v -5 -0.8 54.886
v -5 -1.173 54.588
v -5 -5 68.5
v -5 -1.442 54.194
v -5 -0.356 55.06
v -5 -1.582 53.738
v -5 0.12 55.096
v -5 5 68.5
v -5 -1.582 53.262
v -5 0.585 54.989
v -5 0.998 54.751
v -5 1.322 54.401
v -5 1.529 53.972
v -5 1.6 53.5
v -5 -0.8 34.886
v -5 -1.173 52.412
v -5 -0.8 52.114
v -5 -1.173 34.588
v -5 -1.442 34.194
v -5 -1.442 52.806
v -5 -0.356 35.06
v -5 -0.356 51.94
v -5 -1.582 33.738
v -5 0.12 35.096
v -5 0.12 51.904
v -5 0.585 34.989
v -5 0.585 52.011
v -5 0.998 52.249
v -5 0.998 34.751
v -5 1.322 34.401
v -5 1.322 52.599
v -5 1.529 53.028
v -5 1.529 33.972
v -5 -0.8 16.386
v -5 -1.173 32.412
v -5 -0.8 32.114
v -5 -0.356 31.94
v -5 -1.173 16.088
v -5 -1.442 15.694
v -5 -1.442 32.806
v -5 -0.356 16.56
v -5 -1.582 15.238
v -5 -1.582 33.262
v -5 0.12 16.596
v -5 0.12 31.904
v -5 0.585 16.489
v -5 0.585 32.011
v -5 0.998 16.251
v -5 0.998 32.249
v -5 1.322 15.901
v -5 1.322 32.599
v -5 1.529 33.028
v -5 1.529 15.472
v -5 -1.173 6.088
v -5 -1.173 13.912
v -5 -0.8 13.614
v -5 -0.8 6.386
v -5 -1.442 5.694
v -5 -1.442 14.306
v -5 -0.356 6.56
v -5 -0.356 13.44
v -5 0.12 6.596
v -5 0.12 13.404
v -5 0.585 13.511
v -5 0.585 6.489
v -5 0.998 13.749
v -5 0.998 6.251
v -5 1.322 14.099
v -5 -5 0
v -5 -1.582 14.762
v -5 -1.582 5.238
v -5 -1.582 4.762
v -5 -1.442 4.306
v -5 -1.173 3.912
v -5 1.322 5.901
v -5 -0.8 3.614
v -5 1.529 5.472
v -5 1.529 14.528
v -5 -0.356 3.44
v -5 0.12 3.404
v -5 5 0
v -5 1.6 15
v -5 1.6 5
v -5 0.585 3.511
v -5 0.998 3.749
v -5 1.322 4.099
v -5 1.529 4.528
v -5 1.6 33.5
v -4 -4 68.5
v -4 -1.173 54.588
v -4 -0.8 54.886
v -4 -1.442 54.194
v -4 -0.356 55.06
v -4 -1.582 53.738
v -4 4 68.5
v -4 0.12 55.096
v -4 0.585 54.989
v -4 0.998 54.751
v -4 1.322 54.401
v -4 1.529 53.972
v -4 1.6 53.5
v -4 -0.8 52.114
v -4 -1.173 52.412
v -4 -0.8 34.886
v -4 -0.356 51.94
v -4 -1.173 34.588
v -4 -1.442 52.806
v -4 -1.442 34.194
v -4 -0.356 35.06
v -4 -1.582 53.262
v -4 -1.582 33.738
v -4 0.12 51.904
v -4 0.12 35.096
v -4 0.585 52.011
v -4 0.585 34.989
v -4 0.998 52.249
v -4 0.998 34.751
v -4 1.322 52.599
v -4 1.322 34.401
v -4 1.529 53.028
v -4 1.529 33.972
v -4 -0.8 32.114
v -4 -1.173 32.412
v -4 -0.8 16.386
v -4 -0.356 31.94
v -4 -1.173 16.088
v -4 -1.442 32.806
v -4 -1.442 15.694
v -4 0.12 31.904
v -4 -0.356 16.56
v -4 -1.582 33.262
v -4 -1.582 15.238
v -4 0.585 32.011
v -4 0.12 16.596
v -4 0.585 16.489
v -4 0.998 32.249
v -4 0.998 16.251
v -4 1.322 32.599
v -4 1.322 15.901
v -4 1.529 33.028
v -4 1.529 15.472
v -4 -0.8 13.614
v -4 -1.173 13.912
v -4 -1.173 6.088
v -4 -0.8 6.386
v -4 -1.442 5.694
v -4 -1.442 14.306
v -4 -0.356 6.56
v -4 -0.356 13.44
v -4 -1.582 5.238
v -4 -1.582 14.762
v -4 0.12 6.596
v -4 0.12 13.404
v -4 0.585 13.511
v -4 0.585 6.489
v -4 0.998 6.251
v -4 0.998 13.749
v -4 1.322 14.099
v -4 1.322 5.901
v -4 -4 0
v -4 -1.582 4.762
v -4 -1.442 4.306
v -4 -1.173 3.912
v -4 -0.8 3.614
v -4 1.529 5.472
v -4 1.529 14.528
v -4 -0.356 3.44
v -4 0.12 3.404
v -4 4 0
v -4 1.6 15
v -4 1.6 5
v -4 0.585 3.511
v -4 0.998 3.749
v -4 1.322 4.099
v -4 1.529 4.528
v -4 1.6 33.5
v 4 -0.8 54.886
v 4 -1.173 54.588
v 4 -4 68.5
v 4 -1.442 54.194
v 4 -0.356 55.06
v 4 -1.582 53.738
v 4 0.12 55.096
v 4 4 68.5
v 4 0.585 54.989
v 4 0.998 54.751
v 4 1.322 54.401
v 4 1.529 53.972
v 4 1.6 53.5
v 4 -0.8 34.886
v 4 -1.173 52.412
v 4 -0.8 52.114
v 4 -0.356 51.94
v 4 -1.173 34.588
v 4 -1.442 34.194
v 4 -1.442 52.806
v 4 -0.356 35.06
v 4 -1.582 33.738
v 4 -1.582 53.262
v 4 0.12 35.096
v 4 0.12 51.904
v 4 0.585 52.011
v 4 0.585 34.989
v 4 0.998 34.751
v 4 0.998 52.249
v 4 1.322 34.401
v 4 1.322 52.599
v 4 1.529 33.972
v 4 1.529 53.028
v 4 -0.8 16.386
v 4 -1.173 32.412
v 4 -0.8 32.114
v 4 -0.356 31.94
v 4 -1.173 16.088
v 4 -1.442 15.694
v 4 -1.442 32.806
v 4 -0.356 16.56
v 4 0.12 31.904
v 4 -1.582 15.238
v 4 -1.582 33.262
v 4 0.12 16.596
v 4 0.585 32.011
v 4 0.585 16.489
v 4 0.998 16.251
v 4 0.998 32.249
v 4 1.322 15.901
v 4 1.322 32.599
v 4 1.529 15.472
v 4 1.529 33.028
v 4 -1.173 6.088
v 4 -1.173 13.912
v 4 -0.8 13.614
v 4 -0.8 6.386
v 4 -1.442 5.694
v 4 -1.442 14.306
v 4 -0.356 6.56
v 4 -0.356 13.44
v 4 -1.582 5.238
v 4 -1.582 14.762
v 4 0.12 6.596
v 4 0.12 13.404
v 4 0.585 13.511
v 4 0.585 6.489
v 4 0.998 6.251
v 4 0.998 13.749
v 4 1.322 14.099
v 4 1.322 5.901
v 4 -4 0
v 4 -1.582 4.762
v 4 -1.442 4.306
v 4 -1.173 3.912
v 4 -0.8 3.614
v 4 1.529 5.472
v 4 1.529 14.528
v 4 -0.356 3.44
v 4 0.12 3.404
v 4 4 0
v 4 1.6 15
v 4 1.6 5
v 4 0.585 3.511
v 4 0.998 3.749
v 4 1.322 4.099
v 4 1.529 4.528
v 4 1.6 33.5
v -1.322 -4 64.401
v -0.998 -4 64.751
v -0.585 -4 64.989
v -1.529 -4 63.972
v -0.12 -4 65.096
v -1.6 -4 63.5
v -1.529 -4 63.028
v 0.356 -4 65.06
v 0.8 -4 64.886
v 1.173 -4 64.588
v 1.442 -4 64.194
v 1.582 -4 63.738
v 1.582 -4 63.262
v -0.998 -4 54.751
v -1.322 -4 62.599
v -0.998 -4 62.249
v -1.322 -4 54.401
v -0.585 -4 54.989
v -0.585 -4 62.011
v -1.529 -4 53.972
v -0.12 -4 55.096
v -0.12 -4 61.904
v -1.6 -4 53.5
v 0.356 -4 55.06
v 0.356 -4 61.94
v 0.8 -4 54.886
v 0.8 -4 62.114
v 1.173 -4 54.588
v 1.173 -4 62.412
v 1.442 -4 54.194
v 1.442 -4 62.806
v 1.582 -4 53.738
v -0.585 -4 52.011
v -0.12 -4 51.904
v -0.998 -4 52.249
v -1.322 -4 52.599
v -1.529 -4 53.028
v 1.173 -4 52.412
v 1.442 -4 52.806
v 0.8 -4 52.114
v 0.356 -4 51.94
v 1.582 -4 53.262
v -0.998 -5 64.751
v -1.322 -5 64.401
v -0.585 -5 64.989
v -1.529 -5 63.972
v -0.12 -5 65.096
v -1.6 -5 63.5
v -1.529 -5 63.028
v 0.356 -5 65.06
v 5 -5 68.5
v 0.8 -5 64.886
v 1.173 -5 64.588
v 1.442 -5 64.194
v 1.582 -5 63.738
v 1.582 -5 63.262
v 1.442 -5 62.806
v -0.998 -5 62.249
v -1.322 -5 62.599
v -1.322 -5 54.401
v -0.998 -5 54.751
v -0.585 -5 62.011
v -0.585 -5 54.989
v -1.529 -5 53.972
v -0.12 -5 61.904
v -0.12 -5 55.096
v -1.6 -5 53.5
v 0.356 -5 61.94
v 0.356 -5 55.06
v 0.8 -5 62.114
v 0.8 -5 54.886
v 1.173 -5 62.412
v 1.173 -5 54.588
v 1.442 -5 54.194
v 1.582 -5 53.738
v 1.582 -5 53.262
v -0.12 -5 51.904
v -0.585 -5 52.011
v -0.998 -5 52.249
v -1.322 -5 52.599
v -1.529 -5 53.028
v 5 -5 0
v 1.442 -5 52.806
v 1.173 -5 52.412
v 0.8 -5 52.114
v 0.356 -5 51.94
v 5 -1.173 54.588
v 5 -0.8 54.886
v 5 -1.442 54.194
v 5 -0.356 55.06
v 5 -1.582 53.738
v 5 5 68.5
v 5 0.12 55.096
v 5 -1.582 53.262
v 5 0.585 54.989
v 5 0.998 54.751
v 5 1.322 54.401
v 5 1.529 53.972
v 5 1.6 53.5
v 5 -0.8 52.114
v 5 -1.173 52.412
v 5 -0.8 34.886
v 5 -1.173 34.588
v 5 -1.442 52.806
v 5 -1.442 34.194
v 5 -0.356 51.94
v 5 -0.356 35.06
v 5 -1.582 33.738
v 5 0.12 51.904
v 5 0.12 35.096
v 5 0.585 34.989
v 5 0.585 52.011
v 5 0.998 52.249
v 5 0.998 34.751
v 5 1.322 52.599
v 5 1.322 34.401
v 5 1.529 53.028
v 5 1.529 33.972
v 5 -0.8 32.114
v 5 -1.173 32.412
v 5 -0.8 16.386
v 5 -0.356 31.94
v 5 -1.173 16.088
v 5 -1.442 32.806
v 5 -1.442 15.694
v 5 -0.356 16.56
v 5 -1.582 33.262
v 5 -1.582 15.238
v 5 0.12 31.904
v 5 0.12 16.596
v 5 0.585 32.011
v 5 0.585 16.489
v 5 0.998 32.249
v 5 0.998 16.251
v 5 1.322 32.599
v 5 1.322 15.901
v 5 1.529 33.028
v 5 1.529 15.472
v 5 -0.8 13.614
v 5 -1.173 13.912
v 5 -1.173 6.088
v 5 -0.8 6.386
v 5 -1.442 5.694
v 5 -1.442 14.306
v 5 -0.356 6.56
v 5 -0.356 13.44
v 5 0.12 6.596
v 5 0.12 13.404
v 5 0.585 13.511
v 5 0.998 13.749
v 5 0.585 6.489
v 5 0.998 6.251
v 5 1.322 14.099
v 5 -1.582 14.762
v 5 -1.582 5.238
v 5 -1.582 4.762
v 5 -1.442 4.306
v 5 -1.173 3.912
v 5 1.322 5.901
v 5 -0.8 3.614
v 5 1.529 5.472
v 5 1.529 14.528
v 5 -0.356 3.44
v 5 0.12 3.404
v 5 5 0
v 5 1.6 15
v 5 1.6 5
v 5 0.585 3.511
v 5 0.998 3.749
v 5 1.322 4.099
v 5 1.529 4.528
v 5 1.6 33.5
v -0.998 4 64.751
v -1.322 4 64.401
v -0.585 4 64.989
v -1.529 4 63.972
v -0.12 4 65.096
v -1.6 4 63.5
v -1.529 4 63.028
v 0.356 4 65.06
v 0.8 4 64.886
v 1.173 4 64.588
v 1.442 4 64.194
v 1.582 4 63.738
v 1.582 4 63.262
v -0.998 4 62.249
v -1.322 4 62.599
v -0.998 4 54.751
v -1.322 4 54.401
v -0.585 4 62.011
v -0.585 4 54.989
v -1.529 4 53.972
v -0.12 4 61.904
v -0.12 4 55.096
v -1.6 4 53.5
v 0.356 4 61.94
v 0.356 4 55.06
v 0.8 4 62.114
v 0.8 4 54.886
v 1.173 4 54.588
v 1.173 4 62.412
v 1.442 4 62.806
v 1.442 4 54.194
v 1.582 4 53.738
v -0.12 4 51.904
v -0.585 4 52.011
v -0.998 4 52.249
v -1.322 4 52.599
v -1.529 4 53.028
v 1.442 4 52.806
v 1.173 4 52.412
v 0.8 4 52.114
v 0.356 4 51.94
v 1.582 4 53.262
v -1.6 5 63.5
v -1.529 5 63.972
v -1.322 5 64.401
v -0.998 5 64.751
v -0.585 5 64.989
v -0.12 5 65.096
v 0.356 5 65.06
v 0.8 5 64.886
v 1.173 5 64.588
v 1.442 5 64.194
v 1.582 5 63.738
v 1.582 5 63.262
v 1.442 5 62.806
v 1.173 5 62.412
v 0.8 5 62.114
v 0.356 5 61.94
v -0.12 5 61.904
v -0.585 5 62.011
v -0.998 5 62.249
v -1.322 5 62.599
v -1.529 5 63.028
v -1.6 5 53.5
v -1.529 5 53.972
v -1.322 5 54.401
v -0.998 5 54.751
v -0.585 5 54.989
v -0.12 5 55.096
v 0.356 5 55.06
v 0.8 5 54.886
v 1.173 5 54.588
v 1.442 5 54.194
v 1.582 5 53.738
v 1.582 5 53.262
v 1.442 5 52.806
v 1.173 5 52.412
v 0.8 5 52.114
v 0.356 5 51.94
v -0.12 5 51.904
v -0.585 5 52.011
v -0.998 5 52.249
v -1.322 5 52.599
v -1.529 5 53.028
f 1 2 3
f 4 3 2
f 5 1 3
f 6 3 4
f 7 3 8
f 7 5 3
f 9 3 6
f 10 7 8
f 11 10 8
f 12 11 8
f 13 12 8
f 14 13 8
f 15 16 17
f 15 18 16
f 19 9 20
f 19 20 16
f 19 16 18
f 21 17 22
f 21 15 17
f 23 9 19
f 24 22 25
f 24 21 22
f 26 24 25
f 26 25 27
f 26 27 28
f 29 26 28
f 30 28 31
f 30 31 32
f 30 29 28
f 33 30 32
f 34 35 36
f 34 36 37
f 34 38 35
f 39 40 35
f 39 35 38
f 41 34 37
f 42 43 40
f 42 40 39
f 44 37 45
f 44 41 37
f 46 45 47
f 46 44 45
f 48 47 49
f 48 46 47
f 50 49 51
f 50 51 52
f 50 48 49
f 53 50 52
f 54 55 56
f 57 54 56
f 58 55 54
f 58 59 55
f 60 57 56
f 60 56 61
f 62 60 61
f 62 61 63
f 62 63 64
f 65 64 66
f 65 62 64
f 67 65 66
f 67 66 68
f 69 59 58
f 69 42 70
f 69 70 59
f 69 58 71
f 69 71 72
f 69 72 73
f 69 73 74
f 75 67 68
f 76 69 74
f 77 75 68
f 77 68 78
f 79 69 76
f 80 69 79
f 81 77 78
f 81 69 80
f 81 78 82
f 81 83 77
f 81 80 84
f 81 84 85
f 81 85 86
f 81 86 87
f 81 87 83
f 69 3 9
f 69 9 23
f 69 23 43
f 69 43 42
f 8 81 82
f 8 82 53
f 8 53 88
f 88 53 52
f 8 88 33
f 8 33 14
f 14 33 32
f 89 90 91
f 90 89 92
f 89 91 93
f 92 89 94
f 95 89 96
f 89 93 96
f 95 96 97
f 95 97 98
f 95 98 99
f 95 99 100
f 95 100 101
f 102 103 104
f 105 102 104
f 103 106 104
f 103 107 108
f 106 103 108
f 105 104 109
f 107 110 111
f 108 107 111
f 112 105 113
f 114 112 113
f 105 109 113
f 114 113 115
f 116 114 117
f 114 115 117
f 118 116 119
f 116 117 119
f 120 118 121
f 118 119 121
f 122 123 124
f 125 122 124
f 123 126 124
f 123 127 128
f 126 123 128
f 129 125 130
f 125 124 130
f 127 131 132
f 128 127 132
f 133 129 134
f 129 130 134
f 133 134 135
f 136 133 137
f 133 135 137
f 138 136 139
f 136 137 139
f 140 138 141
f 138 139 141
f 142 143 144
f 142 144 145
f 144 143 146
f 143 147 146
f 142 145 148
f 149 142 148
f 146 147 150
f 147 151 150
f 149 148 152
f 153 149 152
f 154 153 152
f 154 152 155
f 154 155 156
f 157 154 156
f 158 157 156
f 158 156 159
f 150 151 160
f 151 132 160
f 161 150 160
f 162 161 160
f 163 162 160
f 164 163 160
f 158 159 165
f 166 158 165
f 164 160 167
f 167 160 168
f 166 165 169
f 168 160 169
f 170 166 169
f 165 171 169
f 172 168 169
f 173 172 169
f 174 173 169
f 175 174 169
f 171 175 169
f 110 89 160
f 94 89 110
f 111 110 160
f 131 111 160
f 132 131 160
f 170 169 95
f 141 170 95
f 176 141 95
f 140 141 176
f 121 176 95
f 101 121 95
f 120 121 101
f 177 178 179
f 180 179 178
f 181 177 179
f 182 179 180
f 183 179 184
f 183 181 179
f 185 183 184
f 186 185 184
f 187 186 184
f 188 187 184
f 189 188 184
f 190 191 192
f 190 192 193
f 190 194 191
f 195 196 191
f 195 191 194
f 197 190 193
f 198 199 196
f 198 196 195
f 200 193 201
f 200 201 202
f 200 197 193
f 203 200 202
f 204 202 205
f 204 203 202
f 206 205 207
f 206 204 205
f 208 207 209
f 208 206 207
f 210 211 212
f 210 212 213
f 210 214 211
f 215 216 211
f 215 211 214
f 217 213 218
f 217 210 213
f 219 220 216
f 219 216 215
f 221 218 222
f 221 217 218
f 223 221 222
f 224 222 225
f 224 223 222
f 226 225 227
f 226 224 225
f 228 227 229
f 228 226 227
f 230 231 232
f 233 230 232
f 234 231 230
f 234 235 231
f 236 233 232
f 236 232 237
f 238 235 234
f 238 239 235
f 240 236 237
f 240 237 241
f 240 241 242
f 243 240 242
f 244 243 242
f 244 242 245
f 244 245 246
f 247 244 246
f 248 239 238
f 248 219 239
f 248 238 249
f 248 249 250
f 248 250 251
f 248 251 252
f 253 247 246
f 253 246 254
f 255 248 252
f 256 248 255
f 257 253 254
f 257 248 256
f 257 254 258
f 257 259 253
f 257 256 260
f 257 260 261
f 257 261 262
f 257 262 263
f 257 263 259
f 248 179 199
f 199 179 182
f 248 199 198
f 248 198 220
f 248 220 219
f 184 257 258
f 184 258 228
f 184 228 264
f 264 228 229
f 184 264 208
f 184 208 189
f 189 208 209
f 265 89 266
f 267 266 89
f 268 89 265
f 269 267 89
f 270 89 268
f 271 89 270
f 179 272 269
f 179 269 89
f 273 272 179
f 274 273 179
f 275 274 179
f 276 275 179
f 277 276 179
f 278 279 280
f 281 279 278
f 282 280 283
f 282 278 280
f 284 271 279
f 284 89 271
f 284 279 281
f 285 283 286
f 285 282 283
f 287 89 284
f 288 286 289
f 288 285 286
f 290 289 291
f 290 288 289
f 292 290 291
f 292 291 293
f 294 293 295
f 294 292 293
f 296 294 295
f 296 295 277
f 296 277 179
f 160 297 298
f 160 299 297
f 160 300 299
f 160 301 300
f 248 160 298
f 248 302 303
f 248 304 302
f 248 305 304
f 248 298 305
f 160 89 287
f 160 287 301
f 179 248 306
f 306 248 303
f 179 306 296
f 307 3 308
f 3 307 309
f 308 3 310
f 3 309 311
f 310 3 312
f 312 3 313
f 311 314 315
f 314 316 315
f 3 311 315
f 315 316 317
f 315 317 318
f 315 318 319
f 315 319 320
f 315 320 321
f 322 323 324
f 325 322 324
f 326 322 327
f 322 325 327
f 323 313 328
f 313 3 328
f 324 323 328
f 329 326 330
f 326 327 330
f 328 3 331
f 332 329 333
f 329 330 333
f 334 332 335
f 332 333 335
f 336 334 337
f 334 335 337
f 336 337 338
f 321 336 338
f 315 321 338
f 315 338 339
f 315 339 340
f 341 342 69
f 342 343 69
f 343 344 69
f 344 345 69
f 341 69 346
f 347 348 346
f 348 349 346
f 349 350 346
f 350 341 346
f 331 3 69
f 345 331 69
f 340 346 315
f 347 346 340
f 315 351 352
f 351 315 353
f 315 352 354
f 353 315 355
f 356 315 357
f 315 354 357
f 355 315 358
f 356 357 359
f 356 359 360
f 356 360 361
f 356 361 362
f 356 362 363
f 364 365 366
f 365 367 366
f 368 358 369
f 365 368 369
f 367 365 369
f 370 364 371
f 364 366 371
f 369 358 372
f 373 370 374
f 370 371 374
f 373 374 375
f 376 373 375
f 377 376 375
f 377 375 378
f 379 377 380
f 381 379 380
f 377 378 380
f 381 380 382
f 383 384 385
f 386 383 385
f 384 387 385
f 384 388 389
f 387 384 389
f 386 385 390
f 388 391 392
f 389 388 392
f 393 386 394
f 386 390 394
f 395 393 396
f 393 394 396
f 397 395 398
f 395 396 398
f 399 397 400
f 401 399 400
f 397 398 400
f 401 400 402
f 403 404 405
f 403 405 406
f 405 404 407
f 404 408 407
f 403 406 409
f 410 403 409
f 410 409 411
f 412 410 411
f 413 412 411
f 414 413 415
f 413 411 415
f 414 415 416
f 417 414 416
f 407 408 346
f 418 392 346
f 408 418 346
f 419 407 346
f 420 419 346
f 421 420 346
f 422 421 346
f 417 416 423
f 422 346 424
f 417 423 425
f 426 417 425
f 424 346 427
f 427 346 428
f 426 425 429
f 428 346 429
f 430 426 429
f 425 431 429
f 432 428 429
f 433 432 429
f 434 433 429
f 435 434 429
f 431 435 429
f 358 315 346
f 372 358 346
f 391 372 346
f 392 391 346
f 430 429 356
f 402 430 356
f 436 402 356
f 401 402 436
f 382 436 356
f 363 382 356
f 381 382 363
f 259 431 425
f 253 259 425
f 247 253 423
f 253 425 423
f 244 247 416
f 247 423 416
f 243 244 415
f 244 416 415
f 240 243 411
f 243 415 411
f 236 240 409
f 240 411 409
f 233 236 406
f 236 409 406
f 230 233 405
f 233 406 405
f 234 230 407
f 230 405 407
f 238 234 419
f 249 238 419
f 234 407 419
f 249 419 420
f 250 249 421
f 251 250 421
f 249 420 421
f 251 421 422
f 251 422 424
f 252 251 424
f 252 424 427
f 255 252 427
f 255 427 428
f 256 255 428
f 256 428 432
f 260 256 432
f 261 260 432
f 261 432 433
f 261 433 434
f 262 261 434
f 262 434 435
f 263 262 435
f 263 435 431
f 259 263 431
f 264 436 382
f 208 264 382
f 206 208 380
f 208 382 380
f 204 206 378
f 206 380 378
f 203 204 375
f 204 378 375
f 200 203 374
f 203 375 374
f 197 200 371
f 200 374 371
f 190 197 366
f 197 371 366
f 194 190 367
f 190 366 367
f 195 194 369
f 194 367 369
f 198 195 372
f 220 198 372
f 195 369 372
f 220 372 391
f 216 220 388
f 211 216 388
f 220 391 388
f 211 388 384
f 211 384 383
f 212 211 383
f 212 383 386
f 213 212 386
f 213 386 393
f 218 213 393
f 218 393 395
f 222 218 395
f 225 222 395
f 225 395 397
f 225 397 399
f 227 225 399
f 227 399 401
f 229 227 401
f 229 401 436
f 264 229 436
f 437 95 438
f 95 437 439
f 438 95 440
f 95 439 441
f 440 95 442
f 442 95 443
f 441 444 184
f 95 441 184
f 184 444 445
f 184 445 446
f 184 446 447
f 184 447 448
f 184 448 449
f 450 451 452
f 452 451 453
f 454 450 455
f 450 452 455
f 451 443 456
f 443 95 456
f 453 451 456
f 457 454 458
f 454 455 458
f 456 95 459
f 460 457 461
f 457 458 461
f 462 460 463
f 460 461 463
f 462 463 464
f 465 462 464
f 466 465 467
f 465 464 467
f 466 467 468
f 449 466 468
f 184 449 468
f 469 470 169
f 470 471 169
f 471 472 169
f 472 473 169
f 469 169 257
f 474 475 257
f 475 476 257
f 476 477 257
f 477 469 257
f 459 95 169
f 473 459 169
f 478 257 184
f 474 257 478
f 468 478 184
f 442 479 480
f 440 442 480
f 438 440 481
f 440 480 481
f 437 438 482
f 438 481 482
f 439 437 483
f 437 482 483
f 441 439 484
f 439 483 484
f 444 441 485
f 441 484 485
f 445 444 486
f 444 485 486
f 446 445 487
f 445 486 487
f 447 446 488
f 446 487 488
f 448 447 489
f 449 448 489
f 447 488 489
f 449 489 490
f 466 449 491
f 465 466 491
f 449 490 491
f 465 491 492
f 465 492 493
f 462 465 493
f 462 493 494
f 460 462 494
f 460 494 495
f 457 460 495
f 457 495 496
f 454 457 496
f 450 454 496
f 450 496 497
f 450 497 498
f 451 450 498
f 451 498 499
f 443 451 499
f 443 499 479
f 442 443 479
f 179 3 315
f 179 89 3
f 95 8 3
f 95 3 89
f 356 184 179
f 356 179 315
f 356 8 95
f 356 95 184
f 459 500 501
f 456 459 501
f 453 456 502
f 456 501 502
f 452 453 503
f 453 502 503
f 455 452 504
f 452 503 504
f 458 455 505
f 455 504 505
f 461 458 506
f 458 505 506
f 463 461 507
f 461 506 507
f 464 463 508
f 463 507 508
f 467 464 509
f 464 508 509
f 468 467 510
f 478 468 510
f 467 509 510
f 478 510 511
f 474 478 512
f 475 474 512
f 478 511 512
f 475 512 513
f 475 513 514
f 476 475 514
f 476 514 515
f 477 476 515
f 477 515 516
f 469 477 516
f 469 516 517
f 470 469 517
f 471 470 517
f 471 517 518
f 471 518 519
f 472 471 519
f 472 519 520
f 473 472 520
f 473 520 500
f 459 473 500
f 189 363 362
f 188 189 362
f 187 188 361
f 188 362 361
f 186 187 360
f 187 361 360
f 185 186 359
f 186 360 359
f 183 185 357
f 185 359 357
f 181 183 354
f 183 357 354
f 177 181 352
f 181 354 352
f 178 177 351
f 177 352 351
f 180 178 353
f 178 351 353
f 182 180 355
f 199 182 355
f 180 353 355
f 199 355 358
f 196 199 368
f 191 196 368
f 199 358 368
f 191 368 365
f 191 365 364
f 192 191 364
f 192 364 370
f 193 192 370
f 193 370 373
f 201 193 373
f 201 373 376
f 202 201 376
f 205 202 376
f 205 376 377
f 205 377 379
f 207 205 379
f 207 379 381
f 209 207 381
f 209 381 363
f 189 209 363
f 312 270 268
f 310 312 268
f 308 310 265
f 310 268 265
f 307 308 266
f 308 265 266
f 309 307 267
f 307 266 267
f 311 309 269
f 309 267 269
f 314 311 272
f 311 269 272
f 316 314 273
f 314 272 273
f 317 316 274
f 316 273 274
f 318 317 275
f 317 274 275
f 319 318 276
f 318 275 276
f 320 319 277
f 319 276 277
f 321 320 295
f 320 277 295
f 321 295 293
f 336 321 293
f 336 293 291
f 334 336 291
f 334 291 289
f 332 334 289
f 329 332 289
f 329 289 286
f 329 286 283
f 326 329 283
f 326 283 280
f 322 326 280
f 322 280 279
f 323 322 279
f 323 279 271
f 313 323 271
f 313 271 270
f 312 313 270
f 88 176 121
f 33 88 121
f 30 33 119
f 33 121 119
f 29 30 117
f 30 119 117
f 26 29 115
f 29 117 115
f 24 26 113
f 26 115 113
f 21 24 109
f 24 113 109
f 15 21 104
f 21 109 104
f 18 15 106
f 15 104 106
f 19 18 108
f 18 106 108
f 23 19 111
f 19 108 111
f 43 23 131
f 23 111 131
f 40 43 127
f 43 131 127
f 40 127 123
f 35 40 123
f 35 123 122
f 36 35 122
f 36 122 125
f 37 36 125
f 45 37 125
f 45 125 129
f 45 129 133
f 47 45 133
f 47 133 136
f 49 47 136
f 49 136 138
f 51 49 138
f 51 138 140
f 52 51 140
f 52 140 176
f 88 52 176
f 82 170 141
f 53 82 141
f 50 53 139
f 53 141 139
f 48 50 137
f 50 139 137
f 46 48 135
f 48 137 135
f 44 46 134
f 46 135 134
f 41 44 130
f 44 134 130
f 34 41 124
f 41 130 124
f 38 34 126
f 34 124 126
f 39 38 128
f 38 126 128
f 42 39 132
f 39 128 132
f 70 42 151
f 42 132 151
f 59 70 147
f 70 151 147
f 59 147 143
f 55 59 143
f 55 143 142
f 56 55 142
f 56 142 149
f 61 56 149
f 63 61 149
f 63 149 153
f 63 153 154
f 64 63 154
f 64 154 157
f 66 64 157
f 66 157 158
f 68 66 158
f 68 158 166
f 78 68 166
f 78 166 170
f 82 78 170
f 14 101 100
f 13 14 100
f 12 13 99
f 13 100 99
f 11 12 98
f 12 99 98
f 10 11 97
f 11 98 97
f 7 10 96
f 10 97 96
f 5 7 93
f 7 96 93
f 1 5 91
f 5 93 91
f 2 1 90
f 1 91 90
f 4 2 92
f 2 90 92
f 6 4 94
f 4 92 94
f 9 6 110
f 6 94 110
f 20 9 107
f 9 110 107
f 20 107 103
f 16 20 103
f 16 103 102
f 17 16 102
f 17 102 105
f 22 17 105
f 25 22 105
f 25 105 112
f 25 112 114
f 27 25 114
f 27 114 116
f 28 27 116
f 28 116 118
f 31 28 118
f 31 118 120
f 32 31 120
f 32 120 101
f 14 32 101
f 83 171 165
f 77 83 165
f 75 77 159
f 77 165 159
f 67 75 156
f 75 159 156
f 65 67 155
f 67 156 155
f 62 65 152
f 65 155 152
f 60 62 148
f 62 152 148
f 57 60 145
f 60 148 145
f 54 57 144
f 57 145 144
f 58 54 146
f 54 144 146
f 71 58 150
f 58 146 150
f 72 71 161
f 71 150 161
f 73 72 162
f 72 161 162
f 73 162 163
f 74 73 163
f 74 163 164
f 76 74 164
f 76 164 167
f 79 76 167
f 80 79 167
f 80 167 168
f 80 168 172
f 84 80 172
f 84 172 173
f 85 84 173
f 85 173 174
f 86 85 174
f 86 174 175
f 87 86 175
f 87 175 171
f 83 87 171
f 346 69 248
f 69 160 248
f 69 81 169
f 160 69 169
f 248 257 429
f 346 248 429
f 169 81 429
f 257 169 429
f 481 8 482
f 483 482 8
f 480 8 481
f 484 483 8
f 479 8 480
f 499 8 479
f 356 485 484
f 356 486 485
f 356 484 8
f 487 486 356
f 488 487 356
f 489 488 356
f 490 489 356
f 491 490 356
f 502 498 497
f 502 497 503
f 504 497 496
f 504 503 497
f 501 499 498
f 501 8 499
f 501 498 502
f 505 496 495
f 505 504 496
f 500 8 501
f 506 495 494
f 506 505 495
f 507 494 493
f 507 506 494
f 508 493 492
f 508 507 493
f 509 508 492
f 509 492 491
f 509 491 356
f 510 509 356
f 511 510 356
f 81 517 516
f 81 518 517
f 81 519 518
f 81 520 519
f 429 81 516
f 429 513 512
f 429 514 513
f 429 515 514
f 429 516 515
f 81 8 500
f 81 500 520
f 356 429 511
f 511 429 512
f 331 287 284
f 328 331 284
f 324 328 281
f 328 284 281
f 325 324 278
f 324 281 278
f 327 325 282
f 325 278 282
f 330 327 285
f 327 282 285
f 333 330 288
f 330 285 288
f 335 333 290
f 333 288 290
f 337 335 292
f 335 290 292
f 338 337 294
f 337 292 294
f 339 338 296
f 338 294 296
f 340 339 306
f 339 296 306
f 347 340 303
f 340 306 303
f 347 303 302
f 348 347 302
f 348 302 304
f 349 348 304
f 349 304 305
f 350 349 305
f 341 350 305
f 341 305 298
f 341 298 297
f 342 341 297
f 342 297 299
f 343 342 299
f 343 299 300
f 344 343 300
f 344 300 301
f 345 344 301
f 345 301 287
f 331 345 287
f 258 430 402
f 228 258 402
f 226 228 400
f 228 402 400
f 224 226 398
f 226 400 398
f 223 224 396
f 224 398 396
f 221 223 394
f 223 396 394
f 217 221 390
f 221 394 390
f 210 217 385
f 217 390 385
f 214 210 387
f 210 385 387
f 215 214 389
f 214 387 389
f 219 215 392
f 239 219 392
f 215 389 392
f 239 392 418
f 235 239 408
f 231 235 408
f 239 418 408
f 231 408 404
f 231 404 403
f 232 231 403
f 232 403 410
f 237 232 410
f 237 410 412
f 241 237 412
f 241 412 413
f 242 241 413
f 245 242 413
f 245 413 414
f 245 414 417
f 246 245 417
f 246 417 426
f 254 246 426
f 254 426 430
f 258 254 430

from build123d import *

# Parameters (mm, degrees)
SKETCH_1_W          = 10
SKETCH_1_H          = 10
SKETCH_1_W_2        = 8
SKETCH_1_H_2        = 8
EXTRUDE_1_DEPTH     = 68.5
SKETCH_2_R          = 1.6
CUT_EXTRUDE_1_DEPTH = 70.406411808
SKETCH_3_R          = 1.6
CUT_EXTRUDE_2_DEPTH = 70.406411808
SKETCH_4_R          = 1.6
CUT_EXTRUDE_3_DEPTH = 70.406411808


with BuildPart() as part:
    # ｽｹｯﾁ1 → 押し出し-薄板1 (new body)
    with BuildSketch(Plane.XY):
        Rectangle(SKETCH_1_W, SKETCH_1_H)
        Rectangle(SKETCH_1_W_2, SKETCH_1_H_2, mode=Mode.SUBTRACT)
    extrude(amount=EXTRUDE_1_DEPTH)

    # ｽｹｯﾁ2 → ｶｯﾄ - 押し出し1 (cut, through all)
    with BuildSketch(Plane(origin=(0, 5, 0), x_dir=(1, 0, 0), z_dir=(0, 1, 0))):
        with Locations(Location((0, -63.5, 0), (0, 0, 180))):
            Circle(SKETCH_2_R)
        with Locations(Location((0, -53.5, 0), (0, 0, 180))):
            Circle(SKETCH_2_R)
    extrude(amount=-CUT_EXTRUDE_1_DEPTH, mode=Mode.SUBTRACT)

    # ｽｹｯﾁ3 → ｶｯﾄ - 押し出し2 (cut, through all)
    with BuildSketch(Plane(origin=(5, 0, 0), x_dir=(0, 0, -1), z_dir=(1, 0, 0))):
        with Locations(Location((-5, 0, 0), (0, 0, 90))):
            Circle(SKETCH_3_R)
        with Locations(Location((-15, 0, 0), (0, 0, 90))):
            Circle(SKETCH_3_R)
    extrude(amount=-CUT_EXTRUDE_2_DEPTH, mode=Mode.SUBTRACT)

    # ｽｹｯﾁ4 → ｶｯﾄ - 押し出し3 (cut, through all)
    with BuildSketch(Plane(origin=(5, 0, 0), x_dir=(0, 0, -1), z_dir=(1, 0, 0))):
        with Locations(Location((-53.5, 0, 0), (0, 0, 90))):
            Circle(SKETCH_4_R)
        with Locations(Location((-33.5, 0, 0), (0, 0, 90))):
            Circle(SKETCH_4_R)
    extrude(amount=-CUT_EXTRUDE_3_DEPTH, mode=Mode.SUBTRACT)


solid = part.part
